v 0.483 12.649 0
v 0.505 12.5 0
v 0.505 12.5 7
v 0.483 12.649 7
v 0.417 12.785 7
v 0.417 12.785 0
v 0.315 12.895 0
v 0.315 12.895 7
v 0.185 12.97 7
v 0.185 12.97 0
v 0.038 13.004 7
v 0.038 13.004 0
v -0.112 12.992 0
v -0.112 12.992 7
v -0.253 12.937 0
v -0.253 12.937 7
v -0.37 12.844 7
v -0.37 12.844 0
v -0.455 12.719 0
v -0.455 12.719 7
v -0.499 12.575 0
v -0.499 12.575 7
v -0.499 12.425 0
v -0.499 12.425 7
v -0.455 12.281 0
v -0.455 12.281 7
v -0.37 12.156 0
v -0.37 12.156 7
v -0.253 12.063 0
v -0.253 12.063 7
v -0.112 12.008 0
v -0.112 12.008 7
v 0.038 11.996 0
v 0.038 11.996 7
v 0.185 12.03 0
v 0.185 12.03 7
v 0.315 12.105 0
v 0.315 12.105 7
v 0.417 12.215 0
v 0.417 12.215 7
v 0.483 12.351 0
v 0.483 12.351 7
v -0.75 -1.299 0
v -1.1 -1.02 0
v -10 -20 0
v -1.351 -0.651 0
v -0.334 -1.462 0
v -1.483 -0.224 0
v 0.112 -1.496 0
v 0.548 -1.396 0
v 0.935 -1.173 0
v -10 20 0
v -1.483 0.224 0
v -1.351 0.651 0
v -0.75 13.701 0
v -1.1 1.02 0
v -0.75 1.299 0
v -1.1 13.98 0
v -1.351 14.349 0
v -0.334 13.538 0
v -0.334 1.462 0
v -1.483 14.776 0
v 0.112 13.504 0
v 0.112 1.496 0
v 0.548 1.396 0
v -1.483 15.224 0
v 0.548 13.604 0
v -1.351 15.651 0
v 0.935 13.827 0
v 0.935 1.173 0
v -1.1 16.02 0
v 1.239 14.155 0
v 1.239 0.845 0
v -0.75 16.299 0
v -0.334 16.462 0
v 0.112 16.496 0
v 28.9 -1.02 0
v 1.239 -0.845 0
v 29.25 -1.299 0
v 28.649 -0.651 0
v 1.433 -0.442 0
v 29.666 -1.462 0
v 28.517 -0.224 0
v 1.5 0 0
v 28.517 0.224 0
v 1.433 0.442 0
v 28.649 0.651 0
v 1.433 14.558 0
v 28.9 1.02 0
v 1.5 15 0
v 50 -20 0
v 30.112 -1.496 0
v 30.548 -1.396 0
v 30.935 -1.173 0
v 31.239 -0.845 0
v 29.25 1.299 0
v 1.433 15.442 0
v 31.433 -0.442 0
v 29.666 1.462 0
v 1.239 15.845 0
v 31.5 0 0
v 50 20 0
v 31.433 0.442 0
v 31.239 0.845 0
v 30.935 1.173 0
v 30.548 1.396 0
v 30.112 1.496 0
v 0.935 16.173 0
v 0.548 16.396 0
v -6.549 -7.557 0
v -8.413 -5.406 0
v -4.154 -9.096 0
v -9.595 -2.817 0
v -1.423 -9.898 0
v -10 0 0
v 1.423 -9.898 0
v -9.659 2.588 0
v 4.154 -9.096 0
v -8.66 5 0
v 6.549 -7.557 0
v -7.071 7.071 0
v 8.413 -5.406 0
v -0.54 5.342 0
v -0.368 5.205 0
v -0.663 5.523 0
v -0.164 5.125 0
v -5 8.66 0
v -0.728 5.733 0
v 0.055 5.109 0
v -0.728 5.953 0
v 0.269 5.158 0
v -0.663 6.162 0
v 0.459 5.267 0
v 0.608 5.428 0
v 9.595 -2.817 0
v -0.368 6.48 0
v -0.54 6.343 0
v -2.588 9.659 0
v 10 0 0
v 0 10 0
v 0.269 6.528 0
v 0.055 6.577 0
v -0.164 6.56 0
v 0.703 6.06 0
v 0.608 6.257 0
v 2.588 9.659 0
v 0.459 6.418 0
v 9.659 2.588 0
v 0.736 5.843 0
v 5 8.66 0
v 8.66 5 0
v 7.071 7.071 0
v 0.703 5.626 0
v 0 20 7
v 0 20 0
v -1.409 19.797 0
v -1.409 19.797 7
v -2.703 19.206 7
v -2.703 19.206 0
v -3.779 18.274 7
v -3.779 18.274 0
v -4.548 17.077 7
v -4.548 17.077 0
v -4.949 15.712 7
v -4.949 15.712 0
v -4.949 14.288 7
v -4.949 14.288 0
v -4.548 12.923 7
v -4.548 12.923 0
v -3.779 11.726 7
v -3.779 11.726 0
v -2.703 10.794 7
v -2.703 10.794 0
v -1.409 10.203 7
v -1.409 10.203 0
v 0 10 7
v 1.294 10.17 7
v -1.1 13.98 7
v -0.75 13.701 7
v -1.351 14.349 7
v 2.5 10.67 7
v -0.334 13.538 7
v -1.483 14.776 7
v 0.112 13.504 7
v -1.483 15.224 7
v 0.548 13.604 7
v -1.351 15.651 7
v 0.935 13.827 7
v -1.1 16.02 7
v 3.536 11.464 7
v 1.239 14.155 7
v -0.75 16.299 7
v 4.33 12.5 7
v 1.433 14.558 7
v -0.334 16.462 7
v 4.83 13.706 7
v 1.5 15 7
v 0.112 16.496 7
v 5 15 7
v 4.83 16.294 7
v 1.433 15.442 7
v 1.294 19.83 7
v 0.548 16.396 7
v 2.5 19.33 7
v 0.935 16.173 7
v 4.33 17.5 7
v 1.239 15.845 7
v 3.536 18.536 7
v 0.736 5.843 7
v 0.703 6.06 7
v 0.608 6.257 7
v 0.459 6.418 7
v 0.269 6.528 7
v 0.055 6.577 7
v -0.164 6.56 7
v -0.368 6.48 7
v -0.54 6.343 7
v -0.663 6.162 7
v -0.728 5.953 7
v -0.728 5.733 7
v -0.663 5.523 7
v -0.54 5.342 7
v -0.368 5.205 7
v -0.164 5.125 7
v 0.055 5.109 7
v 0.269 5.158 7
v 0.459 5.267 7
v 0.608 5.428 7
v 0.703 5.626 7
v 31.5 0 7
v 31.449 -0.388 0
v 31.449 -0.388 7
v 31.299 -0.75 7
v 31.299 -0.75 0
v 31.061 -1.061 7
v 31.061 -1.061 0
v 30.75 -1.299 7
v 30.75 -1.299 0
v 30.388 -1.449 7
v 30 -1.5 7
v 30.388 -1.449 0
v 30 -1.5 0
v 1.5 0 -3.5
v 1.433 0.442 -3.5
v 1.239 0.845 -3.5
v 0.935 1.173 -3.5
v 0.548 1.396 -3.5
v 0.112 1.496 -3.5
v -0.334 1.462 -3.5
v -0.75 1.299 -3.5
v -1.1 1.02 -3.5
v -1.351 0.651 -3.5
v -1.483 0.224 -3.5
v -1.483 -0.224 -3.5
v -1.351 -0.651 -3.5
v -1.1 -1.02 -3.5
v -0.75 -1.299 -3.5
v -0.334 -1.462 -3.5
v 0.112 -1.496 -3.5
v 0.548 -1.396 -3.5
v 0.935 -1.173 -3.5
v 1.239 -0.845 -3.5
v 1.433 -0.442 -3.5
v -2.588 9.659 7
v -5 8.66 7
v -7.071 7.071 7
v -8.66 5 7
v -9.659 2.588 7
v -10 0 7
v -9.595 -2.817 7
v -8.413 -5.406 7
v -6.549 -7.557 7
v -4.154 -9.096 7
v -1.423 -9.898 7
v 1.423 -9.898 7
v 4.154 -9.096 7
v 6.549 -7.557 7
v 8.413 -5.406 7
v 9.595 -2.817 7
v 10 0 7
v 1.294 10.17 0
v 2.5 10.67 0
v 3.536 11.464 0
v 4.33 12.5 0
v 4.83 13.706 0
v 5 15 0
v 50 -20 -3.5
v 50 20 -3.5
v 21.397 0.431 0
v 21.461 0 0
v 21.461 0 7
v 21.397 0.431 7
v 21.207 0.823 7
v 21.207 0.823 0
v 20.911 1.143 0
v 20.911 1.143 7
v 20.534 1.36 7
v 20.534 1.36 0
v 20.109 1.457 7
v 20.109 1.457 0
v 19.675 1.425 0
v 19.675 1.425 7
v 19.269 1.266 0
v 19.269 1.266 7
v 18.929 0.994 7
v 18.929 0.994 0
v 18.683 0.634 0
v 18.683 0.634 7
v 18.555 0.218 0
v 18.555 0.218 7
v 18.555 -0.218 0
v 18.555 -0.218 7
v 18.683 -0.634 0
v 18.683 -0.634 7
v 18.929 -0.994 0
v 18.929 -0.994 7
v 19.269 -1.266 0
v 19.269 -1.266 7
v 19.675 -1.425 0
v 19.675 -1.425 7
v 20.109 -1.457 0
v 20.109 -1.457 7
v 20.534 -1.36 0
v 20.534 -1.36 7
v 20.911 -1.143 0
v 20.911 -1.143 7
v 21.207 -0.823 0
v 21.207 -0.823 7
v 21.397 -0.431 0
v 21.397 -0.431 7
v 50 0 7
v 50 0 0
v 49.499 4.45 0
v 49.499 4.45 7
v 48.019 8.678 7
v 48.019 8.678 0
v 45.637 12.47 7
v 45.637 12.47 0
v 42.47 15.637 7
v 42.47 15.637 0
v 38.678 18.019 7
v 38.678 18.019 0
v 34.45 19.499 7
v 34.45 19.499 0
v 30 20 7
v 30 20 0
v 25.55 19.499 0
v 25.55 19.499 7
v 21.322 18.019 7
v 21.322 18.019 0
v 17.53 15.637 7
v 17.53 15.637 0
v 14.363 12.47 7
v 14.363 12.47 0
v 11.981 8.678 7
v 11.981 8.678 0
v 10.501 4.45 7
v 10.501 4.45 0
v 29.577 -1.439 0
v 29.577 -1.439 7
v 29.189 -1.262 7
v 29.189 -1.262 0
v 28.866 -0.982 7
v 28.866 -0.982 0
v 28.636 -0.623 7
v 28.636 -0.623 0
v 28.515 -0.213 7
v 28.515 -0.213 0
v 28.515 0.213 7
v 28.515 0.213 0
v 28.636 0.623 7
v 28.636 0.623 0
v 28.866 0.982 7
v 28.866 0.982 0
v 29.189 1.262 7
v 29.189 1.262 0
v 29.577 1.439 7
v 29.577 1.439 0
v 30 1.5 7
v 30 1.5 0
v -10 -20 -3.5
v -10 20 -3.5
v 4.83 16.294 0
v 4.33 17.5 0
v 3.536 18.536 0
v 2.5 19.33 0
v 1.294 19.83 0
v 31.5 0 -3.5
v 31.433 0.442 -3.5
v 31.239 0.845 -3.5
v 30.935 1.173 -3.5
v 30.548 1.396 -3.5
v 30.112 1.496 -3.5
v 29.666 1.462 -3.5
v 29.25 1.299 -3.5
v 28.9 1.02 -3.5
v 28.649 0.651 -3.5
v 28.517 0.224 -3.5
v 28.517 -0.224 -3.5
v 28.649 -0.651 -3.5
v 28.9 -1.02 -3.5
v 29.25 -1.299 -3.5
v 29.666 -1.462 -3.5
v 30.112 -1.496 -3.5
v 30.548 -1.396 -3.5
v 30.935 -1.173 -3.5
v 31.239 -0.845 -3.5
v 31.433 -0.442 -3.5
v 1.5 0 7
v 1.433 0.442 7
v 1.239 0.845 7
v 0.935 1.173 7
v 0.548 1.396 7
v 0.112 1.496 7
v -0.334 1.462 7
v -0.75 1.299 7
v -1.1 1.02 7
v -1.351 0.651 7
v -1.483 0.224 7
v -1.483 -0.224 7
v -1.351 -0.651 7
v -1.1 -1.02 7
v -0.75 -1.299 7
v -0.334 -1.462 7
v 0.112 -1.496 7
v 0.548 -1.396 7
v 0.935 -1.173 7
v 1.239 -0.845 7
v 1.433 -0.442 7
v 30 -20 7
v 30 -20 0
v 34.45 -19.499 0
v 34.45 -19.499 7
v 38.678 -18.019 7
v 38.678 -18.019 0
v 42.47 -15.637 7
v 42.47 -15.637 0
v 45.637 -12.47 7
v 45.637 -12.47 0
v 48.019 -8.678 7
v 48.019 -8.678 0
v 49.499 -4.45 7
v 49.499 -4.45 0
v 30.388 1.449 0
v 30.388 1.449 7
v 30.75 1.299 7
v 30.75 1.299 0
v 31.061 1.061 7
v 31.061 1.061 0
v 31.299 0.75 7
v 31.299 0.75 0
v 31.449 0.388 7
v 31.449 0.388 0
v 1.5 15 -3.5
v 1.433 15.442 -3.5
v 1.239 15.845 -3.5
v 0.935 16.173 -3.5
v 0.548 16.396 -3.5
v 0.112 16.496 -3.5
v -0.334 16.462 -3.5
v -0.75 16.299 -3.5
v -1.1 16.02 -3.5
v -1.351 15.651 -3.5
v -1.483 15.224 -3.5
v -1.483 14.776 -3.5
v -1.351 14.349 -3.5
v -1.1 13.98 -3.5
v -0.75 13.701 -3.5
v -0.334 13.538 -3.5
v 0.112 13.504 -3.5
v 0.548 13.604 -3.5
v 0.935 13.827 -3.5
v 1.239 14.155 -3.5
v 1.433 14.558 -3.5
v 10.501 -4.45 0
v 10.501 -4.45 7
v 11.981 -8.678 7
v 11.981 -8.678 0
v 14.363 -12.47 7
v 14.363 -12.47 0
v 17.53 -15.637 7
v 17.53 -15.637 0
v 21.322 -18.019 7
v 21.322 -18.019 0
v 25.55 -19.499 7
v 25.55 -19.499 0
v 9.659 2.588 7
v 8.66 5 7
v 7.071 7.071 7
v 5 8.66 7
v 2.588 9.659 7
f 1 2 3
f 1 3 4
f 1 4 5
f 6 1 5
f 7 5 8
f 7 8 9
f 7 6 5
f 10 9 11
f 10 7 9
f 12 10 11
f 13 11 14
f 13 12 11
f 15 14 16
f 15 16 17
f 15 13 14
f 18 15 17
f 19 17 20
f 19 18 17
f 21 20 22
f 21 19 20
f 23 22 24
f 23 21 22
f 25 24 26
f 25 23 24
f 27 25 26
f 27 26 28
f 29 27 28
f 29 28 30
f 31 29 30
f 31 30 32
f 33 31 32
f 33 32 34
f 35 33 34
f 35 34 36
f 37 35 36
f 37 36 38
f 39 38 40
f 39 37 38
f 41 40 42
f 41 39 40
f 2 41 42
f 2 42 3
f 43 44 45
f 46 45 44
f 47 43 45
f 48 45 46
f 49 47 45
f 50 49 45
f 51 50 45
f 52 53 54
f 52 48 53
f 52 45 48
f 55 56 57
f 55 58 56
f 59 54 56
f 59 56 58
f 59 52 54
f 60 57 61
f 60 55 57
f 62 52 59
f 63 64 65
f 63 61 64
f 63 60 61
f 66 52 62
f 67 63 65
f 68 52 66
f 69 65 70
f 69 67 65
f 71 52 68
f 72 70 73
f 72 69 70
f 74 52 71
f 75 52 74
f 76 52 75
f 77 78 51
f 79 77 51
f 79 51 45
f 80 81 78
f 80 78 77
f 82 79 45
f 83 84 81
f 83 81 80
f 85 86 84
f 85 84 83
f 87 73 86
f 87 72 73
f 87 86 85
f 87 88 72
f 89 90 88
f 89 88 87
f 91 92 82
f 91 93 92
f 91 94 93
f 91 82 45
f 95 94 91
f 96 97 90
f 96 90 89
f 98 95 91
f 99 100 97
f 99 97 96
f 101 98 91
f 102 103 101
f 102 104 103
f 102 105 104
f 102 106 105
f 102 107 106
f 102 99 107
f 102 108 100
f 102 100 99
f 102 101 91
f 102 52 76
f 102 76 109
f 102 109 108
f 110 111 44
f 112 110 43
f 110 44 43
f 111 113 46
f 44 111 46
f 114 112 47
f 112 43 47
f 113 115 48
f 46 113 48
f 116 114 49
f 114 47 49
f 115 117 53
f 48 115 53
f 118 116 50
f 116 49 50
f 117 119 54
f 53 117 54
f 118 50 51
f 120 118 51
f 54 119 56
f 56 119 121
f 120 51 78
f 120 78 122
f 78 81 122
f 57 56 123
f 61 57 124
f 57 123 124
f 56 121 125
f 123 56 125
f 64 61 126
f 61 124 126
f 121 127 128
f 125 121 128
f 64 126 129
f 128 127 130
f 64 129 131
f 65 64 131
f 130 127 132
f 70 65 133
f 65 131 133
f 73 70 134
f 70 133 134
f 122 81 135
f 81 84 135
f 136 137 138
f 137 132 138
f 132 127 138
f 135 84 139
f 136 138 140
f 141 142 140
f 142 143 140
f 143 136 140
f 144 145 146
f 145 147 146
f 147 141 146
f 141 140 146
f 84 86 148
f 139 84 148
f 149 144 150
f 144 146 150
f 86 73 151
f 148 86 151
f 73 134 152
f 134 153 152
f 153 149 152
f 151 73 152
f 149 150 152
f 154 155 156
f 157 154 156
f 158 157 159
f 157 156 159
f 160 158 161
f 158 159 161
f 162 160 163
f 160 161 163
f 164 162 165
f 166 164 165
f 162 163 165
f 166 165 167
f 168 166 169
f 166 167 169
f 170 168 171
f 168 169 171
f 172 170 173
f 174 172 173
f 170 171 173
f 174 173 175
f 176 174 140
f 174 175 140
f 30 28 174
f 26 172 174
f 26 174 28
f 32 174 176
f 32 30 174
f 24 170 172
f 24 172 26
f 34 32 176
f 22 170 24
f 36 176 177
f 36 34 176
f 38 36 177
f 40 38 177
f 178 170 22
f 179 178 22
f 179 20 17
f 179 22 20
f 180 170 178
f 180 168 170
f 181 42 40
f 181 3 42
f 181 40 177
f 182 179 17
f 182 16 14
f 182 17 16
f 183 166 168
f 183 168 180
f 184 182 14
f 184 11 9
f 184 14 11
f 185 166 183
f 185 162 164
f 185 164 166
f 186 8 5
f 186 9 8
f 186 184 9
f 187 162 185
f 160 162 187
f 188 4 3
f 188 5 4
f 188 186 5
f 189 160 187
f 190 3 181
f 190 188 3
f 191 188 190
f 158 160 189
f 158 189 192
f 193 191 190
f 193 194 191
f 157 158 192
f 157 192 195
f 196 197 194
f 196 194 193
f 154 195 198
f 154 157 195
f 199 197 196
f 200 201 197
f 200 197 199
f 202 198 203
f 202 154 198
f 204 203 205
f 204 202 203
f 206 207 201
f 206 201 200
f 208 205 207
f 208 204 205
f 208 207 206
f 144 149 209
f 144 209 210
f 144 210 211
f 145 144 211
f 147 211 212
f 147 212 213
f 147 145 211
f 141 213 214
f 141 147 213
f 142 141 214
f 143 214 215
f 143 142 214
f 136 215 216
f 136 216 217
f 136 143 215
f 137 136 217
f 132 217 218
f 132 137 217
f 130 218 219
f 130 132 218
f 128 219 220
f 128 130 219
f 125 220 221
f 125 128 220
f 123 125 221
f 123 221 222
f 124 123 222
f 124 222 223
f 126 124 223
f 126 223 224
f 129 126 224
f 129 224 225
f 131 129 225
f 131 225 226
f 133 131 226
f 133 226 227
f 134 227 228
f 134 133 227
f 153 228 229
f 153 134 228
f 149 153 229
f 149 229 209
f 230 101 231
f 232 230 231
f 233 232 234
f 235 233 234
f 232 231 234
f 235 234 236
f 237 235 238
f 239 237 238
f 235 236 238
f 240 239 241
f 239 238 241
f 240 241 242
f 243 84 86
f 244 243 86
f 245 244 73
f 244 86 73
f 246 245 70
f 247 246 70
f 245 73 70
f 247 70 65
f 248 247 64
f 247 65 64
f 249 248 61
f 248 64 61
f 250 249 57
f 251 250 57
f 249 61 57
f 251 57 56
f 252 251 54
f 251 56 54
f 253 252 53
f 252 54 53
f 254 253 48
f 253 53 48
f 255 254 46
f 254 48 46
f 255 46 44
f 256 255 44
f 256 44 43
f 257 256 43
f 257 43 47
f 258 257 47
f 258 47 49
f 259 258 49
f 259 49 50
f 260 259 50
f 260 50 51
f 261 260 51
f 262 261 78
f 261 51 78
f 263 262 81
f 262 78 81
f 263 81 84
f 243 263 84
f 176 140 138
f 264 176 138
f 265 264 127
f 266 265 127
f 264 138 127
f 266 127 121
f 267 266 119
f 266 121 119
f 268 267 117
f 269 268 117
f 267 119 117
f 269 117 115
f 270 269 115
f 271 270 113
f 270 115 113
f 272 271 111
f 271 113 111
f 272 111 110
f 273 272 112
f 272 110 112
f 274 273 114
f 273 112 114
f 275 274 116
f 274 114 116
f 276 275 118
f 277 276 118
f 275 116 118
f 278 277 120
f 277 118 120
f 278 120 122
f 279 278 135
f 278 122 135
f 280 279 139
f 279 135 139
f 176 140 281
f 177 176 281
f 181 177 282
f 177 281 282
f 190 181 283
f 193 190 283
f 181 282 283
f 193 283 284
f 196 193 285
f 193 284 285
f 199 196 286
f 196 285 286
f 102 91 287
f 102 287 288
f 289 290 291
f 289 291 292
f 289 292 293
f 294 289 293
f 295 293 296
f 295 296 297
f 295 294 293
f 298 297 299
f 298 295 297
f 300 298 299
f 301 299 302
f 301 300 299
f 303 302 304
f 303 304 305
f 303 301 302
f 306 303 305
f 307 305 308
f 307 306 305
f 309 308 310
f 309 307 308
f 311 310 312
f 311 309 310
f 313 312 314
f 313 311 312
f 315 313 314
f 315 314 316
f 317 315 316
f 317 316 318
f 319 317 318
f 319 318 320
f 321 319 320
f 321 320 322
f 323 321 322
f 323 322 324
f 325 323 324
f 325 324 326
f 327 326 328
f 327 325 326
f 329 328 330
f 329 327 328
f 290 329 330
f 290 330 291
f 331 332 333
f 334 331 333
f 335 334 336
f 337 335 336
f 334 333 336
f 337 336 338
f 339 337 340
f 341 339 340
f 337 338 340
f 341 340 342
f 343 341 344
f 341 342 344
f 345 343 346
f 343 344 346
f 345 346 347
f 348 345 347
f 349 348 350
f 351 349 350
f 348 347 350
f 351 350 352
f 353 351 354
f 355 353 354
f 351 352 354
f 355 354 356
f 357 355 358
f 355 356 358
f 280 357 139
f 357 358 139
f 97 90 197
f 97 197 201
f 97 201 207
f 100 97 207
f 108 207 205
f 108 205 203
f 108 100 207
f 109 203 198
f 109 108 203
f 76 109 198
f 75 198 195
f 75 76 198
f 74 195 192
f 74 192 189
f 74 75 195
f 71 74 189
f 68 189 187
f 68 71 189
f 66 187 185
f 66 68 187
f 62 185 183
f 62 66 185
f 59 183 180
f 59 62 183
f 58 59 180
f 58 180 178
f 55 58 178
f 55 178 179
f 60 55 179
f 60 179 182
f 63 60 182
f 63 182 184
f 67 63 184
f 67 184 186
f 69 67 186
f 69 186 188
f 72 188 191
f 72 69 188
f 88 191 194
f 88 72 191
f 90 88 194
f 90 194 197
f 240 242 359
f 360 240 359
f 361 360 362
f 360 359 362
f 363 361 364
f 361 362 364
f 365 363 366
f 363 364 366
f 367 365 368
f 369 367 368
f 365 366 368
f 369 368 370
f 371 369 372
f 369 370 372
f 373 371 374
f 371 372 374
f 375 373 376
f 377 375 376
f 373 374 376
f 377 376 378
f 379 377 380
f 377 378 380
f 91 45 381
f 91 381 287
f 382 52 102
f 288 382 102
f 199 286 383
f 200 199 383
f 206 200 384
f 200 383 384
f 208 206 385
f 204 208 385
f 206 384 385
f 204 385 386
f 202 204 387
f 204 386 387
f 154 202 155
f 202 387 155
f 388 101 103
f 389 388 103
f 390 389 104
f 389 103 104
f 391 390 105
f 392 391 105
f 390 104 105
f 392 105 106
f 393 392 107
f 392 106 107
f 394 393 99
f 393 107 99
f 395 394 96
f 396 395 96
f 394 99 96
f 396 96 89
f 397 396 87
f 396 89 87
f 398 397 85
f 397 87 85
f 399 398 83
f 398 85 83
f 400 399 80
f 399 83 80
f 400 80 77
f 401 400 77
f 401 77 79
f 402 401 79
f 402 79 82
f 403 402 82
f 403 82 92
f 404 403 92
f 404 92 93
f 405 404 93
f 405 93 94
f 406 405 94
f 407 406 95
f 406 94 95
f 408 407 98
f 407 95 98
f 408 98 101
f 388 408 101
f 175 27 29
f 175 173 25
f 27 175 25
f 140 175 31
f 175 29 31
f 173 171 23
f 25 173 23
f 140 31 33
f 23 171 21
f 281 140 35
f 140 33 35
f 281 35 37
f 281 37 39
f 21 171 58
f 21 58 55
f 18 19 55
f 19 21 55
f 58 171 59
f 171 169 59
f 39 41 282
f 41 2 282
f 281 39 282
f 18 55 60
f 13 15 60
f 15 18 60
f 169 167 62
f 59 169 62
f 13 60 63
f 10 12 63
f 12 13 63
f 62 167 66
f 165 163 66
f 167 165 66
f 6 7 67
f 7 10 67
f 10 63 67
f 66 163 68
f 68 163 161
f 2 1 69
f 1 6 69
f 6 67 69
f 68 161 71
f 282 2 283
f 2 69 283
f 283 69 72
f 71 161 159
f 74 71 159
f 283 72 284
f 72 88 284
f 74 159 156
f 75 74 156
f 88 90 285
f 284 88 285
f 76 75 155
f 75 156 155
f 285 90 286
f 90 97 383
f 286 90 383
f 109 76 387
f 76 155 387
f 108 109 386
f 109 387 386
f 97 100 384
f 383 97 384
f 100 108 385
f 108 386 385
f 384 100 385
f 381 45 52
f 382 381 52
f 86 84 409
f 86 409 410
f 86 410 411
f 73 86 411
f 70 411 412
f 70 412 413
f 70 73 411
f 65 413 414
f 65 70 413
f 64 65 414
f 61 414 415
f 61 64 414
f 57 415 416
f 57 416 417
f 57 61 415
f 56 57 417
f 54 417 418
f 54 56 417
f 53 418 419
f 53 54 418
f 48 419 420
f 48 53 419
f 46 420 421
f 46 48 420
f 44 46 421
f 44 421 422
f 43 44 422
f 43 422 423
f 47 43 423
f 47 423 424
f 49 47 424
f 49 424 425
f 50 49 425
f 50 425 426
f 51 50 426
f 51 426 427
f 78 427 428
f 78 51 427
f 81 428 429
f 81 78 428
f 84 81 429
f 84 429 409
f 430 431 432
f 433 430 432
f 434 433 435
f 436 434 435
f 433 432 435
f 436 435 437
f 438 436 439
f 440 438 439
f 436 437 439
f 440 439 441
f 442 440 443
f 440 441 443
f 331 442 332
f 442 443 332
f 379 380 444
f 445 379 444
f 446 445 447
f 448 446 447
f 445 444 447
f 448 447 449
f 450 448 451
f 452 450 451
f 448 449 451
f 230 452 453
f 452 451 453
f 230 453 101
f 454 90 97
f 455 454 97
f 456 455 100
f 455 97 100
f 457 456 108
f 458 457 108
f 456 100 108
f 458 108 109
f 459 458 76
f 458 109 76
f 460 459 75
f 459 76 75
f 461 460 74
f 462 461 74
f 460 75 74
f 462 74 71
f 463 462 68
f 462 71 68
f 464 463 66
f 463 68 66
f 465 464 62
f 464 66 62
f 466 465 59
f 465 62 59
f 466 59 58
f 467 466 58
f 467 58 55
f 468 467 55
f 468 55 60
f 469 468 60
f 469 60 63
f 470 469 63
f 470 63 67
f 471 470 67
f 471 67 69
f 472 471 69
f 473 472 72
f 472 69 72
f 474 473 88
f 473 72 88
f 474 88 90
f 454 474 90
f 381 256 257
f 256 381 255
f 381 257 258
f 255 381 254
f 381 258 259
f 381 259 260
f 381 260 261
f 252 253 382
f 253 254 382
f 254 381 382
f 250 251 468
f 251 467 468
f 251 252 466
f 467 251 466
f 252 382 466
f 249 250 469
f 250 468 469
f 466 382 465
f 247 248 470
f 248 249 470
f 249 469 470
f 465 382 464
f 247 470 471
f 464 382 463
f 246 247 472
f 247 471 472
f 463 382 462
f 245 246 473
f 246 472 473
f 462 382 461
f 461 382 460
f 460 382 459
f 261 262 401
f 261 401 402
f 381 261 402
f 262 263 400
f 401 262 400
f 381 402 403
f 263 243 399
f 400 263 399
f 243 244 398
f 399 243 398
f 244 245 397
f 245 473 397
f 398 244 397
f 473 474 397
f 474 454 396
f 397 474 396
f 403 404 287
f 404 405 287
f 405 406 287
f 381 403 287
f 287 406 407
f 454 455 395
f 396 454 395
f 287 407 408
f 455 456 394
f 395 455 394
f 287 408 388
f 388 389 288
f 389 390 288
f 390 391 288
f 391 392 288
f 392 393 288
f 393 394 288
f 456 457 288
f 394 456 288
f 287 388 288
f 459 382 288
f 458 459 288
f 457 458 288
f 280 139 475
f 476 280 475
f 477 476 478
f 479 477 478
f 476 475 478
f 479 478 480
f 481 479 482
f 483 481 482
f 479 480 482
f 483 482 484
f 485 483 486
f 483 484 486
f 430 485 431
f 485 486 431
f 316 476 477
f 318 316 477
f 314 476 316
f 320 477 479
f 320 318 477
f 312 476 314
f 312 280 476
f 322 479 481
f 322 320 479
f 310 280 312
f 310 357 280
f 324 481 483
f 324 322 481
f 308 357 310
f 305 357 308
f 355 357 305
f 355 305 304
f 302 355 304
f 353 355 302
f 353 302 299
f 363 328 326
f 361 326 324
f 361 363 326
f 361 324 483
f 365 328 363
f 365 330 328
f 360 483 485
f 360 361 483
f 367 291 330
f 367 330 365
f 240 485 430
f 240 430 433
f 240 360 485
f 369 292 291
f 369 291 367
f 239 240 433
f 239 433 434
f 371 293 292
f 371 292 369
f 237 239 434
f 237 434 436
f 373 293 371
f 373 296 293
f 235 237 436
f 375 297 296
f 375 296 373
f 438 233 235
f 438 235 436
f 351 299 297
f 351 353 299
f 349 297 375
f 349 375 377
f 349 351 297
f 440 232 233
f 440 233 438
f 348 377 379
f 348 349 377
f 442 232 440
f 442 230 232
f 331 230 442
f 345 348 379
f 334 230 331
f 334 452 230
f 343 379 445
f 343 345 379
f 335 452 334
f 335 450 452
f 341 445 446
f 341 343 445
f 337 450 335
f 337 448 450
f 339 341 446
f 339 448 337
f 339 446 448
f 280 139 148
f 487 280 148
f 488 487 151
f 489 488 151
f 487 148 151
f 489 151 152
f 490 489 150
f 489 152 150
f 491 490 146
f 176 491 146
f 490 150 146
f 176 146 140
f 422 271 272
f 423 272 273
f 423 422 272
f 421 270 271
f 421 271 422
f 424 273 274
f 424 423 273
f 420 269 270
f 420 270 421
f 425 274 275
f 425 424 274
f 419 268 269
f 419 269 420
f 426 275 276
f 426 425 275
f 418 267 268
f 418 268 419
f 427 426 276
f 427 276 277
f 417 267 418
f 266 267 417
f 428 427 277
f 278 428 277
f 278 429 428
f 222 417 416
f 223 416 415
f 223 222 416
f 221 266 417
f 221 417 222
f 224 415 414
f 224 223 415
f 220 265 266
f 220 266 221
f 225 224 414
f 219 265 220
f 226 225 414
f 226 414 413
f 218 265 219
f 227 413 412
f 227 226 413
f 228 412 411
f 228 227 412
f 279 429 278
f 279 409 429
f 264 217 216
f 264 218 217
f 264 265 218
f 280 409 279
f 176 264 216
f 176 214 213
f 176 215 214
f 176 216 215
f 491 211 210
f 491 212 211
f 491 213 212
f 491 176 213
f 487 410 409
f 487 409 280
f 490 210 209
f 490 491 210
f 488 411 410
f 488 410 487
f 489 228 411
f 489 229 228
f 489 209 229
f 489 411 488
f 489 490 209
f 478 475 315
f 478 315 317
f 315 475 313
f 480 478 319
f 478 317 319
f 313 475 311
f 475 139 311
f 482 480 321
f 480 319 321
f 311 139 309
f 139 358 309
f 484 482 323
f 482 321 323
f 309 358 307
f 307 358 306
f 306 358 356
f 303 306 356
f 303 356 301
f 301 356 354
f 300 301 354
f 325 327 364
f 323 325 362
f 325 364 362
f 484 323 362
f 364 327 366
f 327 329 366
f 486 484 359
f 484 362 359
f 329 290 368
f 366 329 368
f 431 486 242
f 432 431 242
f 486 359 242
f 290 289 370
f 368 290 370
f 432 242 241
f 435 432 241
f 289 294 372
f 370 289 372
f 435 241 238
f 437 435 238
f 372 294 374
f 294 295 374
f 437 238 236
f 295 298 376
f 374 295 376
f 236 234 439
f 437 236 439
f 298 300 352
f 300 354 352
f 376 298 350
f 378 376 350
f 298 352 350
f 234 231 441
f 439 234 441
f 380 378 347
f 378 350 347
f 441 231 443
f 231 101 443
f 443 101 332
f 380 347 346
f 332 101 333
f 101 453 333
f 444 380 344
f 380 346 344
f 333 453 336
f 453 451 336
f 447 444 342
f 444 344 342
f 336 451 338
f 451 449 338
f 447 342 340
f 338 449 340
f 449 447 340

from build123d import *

# Parameters (mm, degrees)
F0_R     = 1.46143
F1_DEPTH = 7
F0_R_2   = 1.5
F0_R_3   = 0.736015
F2_DEPTH = 7
F0_R_4   = 0.505078
F3_DEPTH = 7
F4_W     = 60
F4_H     = 40
F4_R     = 1.5
F5_DEPTH = 3.5


with BuildPart() as f1:
    # F0 (on Top) → F1 (new body)
    with BuildSketch(Plane.XY):
        with BuildLine():
            ThreePointArc((50, 0), (44.142136, 14.142136), (30, 20))
            Line((30, 20), (30, 1.5))
            ThreePointArc((30, 1.5), (31.06066, 1.06066), (31.5, 0))
            ThreePointArc((31.5, 0), (31.06066, -1.06066), (30, -1.5))
            Line((30, -1.5), (30, -20))
            ThreePointArc((30, -20), (44.142136, -14.142136), (50, 0))
        make_face()
        with BuildLine():
            Line((30, 1.5), (30, 20))
            ThreePointArc((30, 20), (15.857864, 14.142136), (10, 0))
            ThreePointArc((10, 0), (15.857864, -14.142136), (30, -20))
            Line((30, -20), (30, -1.5))
            ThreePointArc((30, -1.5), (28.5, 0), (30, 1.5))
        make_face()
        with Locations((20, 0)):
            Circle(F0_R, mode=Mode.SUBTRACT)
    extrude(amount=F1_DEPTH)


with BuildPart() as f2:
    # F0 (on Top) → F2 (new body)
    with BuildSketch(Plane.XY):
        with BuildLine():
            ThreePointArc((-10, 0), (0, -10), (10, 0))
            ThreePointArc((10, 0), (7.071068, 7.071068), (0, 10))
            ThreePointArc((0, 10), (-7.071068, 7.071068), (-10, 0))
        make_face()
        Circle(F0_R_2, mode=Mode.SUBTRACT)
        with Locations((0, 5.84281)):
            Circle(F0_R_3, mode=Mode.SUBTRACT)
    extrude(amount=F2_DEPTH)


with BuildPart() as f3:
    # F0 (on Top) → F3 (new body)
    with BuildSketch(Plane.XY):
        with BuildLine():
            ThreePointArc((5, 15), (3.535534, 18.535534), (0, 20))
            ThreePointArc((0, 20), (-5, 15), (0, 10))
            ThreePointArc((0, 10), (3.535534, 11.464466), (5, 15))
        make_face()
        with Locations((0, 12.5)):
            Circle(F0_R_4, mode=Mode.SUBTRACT)
        with Locations((0, 15)):
            Circle(F0_R_2, mode=Mode.SUBTRACT)
    extrude(amount=F3_DEPTH)


with BuildPart() as f5:
    # F4 (on Top) → F5 (new body)
    with BuildSketch(Plane.XY):
        with Locations((20, 0)):
            Rectangle(F4_W, F4_H)
        Circle(F4_R, mode=Mode.SUBTRACT)
        with Locations((0, 15)):
            Circle(F4_R, mode=Mode.SUBTRACT)
        with Locations((30, 0)):
            Circle(F4_R, mode=Mode.SUBTRACT)
    extrude(amount=-F5_DEPTH)


solid = Compound([f1.part, f2.part, f3.part, f5.part])
